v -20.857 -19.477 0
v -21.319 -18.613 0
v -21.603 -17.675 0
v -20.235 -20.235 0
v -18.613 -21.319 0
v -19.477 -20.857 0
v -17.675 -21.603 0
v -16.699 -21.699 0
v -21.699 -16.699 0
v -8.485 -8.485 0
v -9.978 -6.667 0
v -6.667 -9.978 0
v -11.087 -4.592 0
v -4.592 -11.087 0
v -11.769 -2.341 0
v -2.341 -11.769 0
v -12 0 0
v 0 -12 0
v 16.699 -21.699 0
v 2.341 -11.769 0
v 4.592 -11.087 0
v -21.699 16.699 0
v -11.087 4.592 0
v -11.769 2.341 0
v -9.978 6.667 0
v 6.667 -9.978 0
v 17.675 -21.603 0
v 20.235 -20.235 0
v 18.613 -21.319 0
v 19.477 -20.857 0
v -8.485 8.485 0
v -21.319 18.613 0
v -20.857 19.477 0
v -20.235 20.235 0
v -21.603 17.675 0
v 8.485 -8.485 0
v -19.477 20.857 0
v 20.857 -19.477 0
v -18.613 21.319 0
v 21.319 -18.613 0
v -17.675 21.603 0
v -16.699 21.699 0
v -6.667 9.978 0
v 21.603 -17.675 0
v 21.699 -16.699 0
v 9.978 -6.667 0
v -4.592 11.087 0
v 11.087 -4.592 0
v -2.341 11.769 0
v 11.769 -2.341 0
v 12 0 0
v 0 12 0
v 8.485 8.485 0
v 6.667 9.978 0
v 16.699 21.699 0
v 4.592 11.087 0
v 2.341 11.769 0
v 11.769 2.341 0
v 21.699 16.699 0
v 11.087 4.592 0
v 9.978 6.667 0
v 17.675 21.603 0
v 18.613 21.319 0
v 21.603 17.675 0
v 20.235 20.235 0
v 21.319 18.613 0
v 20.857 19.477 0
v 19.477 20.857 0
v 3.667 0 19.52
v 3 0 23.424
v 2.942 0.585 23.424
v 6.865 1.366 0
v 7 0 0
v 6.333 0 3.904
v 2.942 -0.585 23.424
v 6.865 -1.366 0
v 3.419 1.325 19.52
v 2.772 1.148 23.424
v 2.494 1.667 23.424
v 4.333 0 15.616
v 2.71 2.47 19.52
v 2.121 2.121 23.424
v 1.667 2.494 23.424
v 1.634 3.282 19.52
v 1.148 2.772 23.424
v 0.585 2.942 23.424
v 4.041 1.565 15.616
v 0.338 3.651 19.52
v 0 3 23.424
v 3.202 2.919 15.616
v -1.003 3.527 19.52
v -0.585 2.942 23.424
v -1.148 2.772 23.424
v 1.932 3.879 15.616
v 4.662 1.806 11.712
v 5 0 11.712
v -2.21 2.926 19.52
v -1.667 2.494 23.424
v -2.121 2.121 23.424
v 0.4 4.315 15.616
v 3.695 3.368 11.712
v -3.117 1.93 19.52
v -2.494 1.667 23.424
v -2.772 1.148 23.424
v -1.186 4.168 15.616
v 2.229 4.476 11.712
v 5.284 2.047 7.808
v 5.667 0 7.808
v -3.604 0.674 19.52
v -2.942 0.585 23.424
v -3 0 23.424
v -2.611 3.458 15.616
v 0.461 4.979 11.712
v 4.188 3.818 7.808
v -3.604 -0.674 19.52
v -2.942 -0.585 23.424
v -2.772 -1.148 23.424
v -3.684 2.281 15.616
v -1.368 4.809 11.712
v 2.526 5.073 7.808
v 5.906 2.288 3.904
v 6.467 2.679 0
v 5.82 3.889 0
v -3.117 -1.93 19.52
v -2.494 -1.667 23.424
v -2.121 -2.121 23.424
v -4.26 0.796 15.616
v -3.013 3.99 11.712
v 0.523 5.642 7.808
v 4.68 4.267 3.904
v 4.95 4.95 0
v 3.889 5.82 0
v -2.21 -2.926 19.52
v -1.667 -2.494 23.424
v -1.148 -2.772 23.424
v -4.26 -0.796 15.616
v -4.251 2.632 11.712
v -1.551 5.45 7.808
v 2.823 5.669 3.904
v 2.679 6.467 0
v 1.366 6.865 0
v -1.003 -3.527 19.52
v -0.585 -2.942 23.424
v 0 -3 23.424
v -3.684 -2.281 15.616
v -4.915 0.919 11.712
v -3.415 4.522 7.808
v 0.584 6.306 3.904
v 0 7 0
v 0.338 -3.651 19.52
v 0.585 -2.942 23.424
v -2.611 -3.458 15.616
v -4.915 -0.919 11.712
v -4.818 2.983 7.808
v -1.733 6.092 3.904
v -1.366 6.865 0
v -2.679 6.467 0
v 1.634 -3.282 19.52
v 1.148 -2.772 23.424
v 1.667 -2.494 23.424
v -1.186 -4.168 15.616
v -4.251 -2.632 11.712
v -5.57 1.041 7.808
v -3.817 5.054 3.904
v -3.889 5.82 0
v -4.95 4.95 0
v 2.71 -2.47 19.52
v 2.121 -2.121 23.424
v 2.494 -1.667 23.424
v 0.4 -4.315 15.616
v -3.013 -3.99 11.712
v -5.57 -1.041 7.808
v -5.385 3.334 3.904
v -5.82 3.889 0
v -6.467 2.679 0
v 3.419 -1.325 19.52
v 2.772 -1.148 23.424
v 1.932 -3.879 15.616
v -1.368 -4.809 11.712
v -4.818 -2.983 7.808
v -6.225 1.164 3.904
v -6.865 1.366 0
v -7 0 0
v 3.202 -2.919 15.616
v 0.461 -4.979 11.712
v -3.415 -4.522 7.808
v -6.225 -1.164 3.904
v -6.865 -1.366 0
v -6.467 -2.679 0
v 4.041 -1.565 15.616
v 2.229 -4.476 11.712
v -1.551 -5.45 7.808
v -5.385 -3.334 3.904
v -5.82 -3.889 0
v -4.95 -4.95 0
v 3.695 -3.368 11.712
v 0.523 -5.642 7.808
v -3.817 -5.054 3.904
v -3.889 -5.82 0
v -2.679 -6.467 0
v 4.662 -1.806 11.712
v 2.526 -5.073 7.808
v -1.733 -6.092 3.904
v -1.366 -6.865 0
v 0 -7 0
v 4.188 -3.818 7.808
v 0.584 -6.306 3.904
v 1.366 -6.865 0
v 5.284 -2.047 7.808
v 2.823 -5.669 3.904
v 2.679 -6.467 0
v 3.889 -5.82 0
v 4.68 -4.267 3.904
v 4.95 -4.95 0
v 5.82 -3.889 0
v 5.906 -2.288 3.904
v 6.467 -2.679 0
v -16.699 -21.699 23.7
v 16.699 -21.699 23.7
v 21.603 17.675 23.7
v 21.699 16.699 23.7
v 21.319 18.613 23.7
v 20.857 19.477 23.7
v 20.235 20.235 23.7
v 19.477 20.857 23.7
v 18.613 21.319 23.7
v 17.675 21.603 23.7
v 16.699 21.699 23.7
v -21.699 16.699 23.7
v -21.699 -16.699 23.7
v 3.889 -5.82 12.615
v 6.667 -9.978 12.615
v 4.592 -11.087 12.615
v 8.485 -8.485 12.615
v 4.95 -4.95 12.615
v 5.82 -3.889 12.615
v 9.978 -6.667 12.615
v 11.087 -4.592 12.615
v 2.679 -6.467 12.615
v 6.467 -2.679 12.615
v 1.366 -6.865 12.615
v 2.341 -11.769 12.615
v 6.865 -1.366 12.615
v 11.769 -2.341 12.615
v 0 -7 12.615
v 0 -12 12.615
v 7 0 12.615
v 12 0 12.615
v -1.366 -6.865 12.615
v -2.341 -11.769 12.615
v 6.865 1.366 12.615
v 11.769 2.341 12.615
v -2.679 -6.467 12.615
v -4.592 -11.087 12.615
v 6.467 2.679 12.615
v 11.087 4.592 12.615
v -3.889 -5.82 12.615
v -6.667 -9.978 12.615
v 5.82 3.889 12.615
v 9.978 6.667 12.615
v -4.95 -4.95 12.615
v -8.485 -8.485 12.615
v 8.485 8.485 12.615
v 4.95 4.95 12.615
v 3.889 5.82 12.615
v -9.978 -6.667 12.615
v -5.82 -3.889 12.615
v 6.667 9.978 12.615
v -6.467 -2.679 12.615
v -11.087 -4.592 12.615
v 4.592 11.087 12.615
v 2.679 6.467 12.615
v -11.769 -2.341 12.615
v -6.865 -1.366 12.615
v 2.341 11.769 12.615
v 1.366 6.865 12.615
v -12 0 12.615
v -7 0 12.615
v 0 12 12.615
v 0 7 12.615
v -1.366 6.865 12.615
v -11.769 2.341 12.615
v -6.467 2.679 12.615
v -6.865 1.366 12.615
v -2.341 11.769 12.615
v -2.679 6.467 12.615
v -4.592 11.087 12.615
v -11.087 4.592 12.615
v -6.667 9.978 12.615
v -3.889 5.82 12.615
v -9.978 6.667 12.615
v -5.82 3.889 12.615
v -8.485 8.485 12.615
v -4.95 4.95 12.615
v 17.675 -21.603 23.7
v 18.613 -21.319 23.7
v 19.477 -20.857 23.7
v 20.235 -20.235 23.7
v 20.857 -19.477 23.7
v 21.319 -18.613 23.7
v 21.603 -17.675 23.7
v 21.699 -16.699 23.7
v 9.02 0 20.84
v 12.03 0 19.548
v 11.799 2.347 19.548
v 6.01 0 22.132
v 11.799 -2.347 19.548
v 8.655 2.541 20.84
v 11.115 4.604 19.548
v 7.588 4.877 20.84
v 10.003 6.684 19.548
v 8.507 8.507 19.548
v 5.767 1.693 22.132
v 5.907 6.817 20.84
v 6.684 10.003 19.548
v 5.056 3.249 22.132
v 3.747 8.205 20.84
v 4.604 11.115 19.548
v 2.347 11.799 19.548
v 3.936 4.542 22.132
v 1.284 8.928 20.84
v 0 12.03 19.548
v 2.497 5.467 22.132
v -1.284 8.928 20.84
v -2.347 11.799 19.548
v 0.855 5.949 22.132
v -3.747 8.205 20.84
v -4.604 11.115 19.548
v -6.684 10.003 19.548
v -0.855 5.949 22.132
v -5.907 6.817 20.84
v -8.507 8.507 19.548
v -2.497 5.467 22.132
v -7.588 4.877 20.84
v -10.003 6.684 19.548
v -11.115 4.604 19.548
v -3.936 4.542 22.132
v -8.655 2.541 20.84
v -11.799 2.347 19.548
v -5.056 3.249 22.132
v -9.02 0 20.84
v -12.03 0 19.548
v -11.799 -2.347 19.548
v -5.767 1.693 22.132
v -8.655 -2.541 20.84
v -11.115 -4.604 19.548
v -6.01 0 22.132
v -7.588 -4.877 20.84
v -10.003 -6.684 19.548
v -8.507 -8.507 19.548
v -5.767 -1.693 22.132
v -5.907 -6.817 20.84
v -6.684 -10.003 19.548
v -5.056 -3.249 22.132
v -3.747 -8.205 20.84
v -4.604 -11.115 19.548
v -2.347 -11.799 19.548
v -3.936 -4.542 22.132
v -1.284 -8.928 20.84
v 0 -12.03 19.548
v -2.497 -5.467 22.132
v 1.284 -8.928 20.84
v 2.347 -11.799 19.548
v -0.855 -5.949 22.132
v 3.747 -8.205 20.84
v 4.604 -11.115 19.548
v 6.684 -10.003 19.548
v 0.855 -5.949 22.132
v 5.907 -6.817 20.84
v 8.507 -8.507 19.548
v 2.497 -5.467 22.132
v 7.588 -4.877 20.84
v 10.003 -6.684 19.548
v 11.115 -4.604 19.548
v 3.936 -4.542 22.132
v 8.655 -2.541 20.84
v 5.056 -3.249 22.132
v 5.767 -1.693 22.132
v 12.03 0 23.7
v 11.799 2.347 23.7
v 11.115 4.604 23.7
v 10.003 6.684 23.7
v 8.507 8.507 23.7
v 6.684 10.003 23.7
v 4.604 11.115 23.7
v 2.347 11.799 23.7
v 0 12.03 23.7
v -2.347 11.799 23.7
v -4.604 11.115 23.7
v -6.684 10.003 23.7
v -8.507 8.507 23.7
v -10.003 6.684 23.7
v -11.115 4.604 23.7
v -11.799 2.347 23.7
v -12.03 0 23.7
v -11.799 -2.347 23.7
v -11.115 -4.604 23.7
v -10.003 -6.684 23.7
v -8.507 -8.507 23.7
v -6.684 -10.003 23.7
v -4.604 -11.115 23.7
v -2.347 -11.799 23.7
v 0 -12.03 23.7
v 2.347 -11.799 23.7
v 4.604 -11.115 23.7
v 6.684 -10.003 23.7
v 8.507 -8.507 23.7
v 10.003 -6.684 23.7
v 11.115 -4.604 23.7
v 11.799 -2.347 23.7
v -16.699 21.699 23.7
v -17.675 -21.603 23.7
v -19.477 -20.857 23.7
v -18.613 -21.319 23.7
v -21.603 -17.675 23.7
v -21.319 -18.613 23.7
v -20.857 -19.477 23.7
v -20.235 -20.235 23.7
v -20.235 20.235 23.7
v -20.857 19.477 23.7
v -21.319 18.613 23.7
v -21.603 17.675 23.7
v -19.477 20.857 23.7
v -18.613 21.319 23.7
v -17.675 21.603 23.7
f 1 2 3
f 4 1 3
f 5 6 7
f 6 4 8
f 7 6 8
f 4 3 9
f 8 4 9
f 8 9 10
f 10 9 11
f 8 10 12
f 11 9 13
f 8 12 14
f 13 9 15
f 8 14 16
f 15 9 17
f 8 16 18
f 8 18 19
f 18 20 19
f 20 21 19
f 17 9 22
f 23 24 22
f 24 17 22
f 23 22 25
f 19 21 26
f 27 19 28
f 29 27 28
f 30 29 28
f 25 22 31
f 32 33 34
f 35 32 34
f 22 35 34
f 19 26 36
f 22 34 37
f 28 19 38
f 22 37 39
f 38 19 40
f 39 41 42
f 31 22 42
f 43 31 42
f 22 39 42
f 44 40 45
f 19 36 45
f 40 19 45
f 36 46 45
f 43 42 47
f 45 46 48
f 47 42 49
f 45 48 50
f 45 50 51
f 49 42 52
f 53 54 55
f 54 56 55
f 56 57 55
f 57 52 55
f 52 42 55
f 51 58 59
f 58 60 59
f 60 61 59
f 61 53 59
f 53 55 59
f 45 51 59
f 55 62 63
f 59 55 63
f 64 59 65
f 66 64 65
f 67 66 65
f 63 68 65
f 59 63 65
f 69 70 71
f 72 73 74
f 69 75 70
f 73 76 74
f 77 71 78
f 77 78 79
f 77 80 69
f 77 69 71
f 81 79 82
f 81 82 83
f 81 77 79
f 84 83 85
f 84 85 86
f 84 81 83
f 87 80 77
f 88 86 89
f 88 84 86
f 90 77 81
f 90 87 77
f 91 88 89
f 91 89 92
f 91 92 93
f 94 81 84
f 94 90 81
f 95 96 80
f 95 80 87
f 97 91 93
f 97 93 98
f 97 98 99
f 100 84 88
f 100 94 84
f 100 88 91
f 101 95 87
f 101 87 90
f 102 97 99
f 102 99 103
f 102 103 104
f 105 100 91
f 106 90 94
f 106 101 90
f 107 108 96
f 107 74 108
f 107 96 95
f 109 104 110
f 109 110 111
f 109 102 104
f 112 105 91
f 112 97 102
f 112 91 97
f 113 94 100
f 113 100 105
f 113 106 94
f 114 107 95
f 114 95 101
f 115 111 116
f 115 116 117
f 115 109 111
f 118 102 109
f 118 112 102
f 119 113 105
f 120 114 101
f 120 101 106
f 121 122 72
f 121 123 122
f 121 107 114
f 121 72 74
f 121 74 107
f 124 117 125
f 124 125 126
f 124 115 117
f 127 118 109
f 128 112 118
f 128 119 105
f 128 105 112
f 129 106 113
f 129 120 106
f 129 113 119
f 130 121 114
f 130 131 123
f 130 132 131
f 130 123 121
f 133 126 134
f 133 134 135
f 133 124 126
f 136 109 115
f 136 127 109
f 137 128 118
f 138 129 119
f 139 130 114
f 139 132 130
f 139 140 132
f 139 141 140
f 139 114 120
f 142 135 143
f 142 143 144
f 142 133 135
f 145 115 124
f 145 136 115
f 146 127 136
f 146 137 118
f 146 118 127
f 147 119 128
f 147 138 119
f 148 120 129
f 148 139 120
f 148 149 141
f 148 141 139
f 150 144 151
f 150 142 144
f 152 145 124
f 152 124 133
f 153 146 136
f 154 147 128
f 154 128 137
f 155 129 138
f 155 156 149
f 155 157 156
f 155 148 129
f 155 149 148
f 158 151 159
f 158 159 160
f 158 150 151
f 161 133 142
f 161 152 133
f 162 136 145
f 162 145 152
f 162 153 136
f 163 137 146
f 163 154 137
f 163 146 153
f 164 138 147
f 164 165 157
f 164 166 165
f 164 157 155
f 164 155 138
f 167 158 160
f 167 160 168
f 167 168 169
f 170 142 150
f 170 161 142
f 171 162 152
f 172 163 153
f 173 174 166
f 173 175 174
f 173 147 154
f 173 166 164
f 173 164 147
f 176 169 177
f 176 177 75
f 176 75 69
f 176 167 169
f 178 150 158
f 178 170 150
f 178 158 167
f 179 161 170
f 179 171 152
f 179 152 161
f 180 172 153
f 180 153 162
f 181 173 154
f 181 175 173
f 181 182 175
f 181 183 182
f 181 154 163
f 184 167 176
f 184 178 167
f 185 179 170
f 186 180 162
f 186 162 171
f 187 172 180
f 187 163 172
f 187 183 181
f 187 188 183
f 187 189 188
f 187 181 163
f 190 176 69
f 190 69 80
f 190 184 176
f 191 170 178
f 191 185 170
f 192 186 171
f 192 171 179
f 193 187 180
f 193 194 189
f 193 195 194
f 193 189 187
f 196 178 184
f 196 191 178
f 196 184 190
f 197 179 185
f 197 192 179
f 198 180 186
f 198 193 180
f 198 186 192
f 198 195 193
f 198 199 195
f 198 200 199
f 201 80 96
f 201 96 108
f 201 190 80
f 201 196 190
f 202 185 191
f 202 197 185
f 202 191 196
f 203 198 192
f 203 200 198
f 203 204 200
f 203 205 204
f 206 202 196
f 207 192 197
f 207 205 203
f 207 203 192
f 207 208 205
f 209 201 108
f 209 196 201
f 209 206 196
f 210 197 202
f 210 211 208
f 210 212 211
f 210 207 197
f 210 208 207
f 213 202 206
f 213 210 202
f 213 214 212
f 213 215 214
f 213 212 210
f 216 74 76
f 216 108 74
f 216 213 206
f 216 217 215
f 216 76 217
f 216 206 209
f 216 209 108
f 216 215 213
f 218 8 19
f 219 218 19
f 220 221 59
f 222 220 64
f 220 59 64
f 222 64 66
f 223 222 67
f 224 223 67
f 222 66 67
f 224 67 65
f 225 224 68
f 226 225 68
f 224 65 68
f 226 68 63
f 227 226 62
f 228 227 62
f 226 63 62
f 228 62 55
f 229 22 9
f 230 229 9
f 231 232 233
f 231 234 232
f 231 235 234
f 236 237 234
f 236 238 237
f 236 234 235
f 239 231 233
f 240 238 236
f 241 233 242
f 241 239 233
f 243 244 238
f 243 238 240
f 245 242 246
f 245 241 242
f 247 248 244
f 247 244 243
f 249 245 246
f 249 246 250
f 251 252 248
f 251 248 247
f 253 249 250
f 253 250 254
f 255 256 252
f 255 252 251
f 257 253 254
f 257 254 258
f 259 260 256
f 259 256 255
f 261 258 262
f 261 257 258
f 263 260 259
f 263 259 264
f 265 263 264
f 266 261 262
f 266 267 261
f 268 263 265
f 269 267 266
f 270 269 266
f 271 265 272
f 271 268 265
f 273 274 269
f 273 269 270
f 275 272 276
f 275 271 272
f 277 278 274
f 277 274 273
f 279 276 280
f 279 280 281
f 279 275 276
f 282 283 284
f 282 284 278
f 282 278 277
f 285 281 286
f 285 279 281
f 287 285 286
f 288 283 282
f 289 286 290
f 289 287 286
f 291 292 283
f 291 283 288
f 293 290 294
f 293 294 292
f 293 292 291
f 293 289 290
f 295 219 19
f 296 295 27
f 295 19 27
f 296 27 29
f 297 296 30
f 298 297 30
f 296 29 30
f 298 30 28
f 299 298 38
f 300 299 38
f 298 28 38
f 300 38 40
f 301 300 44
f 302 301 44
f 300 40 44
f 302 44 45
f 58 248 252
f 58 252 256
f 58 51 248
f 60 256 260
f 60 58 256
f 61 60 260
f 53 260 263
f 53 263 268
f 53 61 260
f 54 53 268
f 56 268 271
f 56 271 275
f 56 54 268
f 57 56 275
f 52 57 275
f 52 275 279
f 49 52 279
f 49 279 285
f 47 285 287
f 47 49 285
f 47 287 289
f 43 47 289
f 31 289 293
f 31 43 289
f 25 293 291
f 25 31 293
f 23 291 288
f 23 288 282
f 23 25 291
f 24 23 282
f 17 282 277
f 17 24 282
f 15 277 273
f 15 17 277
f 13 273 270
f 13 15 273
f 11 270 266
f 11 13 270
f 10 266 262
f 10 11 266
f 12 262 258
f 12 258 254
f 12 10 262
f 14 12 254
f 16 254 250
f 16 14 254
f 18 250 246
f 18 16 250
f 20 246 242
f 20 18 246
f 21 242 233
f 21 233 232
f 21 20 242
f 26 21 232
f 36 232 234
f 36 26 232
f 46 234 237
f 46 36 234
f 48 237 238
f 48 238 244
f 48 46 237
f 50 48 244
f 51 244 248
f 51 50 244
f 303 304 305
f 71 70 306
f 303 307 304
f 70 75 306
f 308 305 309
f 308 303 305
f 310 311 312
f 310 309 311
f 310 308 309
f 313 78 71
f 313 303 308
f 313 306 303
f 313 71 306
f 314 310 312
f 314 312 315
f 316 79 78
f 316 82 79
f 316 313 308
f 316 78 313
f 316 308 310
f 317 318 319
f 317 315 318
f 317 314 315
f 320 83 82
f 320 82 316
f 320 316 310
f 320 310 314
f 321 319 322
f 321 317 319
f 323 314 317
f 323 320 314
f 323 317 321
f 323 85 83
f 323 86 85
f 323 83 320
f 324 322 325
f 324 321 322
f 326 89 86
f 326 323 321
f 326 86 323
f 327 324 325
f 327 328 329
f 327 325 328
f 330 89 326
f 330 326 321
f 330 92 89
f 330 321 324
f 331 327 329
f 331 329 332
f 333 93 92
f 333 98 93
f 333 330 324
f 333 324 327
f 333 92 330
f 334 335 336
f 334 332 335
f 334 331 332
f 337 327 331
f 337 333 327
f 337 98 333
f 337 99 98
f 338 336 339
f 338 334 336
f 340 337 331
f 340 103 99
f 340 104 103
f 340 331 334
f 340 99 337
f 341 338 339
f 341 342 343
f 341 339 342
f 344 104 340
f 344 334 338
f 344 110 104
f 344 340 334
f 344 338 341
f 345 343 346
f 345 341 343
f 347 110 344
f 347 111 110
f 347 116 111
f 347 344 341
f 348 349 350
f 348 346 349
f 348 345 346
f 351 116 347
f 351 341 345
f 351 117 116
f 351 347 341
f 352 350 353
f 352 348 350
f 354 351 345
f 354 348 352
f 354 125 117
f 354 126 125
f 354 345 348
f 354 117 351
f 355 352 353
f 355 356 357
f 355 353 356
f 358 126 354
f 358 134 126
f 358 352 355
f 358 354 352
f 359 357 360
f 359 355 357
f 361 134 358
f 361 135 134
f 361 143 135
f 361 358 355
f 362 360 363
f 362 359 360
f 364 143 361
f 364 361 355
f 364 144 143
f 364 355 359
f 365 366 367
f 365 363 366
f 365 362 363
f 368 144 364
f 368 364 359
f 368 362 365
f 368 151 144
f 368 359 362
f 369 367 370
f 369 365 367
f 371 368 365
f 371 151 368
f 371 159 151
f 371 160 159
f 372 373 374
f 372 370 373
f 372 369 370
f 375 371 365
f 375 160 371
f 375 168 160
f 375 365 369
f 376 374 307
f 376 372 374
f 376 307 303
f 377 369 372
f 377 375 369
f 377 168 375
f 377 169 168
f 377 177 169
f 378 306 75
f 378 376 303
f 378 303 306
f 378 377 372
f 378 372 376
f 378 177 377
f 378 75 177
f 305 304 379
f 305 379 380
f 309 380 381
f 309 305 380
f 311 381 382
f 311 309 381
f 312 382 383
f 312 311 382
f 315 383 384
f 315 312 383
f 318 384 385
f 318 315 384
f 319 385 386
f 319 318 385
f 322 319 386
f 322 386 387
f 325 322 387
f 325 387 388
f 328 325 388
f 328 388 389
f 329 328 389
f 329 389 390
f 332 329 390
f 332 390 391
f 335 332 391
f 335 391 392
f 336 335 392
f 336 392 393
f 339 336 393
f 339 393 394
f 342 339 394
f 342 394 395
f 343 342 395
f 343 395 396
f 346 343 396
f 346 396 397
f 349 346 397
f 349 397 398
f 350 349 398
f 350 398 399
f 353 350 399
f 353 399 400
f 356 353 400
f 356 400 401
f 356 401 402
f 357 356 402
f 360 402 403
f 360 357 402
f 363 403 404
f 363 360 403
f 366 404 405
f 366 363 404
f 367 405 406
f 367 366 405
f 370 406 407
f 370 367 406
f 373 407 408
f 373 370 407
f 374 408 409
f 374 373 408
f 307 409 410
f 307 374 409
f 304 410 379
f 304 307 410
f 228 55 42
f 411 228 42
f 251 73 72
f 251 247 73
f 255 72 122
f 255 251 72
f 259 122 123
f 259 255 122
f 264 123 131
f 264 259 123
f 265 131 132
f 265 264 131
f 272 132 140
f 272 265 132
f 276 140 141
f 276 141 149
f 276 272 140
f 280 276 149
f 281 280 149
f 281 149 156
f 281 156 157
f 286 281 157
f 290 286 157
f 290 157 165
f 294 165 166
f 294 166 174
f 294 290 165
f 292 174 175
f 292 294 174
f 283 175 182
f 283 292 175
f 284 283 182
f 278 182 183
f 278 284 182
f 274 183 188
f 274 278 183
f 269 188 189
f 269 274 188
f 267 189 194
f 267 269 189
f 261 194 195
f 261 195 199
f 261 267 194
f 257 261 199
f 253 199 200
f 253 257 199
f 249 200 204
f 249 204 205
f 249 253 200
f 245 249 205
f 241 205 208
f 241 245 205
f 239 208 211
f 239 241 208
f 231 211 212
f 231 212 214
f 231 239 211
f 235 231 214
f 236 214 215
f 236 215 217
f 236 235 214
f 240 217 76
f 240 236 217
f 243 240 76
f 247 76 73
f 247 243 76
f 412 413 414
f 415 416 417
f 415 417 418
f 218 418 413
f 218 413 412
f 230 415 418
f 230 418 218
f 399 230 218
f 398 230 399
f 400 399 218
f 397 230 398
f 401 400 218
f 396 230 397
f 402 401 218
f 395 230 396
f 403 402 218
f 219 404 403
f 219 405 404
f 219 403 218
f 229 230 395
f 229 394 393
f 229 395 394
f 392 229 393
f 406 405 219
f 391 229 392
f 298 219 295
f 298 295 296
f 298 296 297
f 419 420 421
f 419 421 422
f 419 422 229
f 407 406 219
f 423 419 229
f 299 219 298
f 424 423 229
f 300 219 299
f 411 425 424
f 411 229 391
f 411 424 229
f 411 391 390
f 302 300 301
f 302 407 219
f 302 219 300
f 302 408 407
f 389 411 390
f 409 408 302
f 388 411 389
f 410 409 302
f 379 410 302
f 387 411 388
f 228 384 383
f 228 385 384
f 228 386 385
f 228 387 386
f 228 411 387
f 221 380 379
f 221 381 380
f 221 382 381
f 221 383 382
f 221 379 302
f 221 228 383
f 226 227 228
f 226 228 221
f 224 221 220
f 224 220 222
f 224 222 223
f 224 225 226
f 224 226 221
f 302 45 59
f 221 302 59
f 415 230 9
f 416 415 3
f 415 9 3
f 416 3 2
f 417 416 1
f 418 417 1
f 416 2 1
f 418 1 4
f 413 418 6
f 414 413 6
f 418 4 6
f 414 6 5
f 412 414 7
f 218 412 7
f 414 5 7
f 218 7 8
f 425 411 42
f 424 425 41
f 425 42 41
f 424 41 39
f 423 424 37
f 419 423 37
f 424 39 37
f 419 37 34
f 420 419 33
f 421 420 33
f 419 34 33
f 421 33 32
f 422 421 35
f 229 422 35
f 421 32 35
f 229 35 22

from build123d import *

# Parameters (mm, degrees)
F2_R     = 12.030304
F3_DEPTH = 23.7


with BuildPart() as f1:
    # F0 (on Front) → F1 (revolve)
    with BuildSketch(Plane.XZ):
        Polygon((21.5, 15.483735), (3, 23.423815), (7, 0), (7, 12.614677), (12, 12.614677), (12, 0), (21.5, 0), align=None)
    revolve(axis=Axis((0, 0, 20), (0, 0, 1)))

    # F2 (on Top) → F3 (join)
    with BuildSketch(Plane.XY):
        with BuildLine():
            Line((16.699362, 21.699362), (-16.699362, 21.699362))
            ThreePointArc((-16.699362, 21.699362), (-20.234895, 20.234895), (-21.699362, 16.699362))
            Line((-21.699362, 16.699362), (-21.699362, -16.699362))
            ThreePointArc((-21.699362, -16.699362), (-20.234895, -20.234895), (-16.699362, -21.699362))
            Line((-16.699362, -21.699362), (16.699362, -21.699362))
            ThreePointArc((16.699362, -21.699362), (20.234895, -20.234895), (21.699362, -16.699362))
            Line((21.699362, -16.699362), (21.699362, 16.699362))
            ThreePointArc((21.699362, 16.699362), (20.234895, 20.234895), (16.699362, 21.699362))
        make_face()
        Circle(F2_R, mode=Mode.SUBTRACT)
    extrude(amount=F3_DEPTH)


solid = f1.part
